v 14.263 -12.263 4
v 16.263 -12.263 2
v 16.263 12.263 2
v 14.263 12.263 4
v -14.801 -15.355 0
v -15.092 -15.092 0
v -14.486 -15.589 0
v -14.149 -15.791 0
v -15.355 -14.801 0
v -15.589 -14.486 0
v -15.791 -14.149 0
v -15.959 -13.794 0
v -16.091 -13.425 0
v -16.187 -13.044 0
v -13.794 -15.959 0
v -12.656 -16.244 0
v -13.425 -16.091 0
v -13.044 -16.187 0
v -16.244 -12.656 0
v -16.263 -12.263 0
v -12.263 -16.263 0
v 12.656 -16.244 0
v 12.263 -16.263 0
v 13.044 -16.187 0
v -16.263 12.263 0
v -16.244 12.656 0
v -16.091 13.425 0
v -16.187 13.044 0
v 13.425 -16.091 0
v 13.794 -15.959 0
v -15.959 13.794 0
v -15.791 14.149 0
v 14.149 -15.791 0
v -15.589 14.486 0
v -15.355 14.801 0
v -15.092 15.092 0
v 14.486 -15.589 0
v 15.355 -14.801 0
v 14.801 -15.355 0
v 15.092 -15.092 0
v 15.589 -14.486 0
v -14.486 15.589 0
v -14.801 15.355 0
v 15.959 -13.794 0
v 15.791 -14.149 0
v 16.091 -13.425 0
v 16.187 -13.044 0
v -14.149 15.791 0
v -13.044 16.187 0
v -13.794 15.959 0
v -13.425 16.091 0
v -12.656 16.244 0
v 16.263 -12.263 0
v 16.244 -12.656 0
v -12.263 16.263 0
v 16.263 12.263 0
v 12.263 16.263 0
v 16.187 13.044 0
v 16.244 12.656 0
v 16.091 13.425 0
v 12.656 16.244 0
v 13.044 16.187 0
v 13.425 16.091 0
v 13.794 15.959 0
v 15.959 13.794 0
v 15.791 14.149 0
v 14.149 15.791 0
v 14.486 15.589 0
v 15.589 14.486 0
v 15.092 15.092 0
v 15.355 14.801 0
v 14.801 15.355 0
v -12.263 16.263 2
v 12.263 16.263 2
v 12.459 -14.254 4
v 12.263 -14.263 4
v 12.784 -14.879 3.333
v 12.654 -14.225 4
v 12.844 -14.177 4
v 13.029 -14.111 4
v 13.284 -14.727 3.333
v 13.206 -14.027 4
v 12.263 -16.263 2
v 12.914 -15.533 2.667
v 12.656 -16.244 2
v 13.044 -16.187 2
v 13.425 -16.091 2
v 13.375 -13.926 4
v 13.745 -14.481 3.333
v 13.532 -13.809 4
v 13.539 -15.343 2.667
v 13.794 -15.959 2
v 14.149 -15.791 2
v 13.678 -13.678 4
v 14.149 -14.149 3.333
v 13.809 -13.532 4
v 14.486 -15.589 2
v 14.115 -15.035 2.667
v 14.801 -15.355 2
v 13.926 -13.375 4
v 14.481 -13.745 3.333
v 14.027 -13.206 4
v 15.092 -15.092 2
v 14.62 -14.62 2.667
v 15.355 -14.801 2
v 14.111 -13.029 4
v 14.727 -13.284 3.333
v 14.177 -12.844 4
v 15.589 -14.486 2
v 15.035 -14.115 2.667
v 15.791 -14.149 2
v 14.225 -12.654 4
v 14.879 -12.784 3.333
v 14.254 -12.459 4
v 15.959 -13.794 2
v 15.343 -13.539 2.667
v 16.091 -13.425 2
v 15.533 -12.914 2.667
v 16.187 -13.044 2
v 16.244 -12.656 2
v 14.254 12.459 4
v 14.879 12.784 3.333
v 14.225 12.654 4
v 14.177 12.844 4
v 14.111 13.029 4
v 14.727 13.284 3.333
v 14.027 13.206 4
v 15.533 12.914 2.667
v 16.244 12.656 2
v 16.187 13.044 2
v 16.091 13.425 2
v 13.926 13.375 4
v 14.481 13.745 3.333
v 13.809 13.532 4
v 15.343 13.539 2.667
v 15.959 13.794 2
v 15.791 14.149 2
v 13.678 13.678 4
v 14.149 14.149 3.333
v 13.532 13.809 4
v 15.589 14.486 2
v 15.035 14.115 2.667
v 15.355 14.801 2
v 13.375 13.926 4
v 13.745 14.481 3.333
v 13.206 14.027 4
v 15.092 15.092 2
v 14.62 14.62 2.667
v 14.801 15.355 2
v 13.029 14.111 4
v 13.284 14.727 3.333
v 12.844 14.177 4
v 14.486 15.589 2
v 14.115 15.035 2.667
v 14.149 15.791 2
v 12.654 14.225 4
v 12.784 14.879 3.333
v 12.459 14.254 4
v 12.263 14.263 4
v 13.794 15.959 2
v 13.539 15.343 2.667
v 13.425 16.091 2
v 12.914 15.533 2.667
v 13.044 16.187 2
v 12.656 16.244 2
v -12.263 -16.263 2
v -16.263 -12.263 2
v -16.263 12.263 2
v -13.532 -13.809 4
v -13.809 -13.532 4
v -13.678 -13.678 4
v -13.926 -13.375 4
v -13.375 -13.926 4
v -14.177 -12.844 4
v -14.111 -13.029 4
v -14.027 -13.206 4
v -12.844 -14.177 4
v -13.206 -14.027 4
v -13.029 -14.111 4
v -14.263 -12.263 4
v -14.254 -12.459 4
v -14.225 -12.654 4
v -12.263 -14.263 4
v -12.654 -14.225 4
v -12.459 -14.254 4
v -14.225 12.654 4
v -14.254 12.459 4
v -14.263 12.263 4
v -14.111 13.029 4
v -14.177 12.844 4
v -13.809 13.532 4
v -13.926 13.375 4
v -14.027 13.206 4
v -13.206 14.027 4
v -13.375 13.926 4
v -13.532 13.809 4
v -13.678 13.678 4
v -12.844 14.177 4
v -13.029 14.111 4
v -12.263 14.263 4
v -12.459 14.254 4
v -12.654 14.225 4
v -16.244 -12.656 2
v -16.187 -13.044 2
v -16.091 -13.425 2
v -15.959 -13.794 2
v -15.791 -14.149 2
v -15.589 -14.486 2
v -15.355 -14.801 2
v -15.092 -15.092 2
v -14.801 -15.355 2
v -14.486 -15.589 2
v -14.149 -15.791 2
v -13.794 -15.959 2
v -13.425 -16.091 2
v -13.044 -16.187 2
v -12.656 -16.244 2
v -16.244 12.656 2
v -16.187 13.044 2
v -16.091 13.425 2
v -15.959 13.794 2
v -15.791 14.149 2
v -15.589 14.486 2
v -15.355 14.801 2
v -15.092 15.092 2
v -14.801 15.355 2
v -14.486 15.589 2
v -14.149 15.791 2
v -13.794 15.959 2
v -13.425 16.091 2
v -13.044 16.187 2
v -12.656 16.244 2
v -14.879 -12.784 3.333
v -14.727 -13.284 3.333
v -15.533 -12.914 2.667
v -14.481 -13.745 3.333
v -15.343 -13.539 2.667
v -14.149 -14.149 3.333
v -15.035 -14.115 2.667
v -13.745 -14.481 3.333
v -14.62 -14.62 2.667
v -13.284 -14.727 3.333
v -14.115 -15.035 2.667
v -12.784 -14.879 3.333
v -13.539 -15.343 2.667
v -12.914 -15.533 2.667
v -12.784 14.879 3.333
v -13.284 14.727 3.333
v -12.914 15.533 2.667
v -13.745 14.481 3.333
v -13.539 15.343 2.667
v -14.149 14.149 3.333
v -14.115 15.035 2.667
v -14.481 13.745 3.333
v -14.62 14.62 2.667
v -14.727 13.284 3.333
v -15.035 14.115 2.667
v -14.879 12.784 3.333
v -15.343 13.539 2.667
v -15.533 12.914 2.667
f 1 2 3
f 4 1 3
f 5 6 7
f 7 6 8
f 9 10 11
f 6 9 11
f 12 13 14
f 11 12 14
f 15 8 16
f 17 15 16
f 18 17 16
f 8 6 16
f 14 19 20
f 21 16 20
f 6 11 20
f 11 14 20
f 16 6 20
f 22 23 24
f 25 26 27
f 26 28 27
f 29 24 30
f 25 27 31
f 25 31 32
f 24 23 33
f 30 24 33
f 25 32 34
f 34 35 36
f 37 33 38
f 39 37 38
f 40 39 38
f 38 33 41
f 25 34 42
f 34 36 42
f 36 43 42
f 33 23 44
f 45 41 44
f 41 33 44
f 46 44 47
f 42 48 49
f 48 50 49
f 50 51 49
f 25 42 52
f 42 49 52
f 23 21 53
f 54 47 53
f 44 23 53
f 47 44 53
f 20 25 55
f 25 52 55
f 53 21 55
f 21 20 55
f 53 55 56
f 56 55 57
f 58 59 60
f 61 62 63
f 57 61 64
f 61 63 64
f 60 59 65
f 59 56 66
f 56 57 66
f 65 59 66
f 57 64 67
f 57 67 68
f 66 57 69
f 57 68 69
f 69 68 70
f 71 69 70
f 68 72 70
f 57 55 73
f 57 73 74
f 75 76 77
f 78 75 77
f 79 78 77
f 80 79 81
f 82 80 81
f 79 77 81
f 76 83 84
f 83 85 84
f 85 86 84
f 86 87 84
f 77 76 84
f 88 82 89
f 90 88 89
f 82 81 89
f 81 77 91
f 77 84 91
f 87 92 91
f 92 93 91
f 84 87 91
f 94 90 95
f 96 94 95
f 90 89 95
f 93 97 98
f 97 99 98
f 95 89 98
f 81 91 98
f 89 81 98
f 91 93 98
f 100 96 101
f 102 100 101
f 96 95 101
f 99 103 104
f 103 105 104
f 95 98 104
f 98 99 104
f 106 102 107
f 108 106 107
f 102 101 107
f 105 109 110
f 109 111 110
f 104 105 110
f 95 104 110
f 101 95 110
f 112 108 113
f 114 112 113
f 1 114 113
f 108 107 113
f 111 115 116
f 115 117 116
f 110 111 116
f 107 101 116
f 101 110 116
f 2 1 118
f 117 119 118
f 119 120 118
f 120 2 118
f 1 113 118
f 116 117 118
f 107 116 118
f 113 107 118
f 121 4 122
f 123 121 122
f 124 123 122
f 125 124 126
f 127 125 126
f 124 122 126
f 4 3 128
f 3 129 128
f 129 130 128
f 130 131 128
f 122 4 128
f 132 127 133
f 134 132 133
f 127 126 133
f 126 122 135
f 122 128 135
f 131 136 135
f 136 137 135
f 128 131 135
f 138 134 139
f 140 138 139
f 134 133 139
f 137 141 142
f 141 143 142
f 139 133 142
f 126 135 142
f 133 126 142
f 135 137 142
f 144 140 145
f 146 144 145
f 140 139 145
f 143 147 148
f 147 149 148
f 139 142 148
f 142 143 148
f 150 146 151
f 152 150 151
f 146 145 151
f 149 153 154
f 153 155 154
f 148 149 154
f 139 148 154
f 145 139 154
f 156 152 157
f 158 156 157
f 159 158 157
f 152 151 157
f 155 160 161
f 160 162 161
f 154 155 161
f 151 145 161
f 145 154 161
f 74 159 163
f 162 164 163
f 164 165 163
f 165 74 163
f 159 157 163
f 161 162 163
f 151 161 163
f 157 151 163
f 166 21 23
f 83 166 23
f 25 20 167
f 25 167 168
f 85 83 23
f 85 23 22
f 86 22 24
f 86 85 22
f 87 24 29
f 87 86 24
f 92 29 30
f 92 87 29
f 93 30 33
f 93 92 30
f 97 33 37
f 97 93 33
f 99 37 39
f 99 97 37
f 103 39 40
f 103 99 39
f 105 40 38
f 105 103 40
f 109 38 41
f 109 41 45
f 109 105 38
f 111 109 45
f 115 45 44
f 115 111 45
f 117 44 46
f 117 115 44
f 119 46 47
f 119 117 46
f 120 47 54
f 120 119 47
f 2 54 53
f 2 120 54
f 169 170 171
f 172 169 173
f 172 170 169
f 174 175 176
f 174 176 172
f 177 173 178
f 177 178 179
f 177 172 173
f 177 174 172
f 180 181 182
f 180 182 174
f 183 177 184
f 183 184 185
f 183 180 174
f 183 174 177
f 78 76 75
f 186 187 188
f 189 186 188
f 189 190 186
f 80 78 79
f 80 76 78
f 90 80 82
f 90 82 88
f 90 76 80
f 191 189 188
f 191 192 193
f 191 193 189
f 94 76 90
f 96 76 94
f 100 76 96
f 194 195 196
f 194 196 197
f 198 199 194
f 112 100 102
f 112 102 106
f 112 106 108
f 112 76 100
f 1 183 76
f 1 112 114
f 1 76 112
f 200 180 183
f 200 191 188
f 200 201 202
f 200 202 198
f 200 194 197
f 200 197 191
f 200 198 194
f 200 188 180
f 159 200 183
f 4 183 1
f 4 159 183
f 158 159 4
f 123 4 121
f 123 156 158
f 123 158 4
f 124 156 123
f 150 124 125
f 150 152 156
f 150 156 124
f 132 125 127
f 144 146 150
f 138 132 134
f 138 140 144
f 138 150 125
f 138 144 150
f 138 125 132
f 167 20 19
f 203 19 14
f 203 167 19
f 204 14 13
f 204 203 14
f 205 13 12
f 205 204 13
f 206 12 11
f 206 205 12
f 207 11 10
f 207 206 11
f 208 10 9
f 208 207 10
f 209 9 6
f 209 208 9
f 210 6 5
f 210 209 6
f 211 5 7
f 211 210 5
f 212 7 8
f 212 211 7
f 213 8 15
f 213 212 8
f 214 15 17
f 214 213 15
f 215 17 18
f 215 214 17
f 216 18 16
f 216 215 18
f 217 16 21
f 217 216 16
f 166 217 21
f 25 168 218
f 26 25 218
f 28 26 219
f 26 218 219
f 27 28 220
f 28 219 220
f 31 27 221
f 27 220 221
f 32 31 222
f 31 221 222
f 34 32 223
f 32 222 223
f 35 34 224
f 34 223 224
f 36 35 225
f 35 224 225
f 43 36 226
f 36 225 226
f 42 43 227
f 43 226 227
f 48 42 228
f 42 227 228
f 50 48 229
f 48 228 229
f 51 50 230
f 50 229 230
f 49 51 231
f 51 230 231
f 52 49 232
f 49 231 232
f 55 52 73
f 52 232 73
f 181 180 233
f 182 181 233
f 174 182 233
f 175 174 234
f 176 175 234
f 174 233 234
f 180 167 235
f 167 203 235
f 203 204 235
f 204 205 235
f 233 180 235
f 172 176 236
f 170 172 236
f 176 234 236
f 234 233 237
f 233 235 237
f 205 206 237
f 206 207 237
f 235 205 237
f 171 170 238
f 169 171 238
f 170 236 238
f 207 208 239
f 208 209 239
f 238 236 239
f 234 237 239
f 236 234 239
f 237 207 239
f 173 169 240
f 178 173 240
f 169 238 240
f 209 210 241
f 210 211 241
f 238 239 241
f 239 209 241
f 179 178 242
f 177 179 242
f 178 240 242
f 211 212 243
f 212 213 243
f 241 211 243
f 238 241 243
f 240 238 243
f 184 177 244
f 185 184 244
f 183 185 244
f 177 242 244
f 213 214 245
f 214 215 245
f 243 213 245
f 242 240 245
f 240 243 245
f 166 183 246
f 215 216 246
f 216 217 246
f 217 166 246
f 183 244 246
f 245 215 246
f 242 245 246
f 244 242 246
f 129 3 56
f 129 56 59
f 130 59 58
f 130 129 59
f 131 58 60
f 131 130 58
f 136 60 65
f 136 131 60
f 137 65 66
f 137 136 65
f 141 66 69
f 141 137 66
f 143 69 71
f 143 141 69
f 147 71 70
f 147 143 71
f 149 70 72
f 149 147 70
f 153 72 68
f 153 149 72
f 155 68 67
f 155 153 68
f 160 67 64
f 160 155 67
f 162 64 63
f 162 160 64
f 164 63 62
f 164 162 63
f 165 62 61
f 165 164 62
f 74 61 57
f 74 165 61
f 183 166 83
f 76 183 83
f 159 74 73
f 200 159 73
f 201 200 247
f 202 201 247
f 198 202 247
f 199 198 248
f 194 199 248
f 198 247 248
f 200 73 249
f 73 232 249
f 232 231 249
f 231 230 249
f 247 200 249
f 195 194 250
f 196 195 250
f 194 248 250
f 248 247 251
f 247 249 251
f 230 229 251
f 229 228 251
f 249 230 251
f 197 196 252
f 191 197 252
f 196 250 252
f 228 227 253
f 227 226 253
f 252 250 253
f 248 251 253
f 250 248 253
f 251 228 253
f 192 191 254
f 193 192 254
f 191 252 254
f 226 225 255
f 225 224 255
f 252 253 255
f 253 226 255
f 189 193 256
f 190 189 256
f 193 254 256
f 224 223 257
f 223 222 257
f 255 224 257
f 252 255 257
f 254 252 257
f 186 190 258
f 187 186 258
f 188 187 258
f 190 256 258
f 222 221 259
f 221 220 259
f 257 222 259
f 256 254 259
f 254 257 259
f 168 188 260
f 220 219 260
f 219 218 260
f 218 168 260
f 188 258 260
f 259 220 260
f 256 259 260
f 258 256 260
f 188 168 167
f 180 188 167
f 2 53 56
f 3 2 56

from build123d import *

# Parameters (mm, degrees)
SKETCH1_W           = 32.526911934
SKETCH1_H           = 32.526911934
BOSS_EXTRUDE1_DEPTH = 4
FILLET1_R           = 4
CHAMFER1_SIZE       = 2


with BuildPart() as part:
    # Sketch1 → Boss-Extrude1 (new body)
    with BuildSketch(Plane.XY):
        Rectangle(SKETCH1_W, SKETCH1_H)
    extrude(amount=BOSS_EXTRUDE1_DEPTH)

    # Fillet1
    fillet1_edges = [part.edges().sort_by_distance(p)[0] for p in [
        (-16.263455967, 16.263455967, 2),
        (16.263455967, 16.263455967, 2),
        (16.263455967, -16.263455967, 2),
        (-16.263455967, -16.263455967, 2),
    ]]
    fillet(fillet1_edges, radius=FILLET1_R)

    # Chamfer1
    chamfer1_edges = [part.edges().sort_by_distance(p)[0] for p in [
        (0, -16.263455967, 4),
        (-16.263455967, 0, 4),
        (16.263455967, 0, 4),
        (0, 16.263455967, 4),
        (-15.091883092, 15.091883092, 4),
        (15.091883092, 15.091883092, 4),
        (15.091883092, -15.091883092, 4),
        (-15.091883092, -15.091883092, 4),
    ]]
    chamfer(chamfer1_edges, length=CHAMFER1_SIZE)


solid = part.part
